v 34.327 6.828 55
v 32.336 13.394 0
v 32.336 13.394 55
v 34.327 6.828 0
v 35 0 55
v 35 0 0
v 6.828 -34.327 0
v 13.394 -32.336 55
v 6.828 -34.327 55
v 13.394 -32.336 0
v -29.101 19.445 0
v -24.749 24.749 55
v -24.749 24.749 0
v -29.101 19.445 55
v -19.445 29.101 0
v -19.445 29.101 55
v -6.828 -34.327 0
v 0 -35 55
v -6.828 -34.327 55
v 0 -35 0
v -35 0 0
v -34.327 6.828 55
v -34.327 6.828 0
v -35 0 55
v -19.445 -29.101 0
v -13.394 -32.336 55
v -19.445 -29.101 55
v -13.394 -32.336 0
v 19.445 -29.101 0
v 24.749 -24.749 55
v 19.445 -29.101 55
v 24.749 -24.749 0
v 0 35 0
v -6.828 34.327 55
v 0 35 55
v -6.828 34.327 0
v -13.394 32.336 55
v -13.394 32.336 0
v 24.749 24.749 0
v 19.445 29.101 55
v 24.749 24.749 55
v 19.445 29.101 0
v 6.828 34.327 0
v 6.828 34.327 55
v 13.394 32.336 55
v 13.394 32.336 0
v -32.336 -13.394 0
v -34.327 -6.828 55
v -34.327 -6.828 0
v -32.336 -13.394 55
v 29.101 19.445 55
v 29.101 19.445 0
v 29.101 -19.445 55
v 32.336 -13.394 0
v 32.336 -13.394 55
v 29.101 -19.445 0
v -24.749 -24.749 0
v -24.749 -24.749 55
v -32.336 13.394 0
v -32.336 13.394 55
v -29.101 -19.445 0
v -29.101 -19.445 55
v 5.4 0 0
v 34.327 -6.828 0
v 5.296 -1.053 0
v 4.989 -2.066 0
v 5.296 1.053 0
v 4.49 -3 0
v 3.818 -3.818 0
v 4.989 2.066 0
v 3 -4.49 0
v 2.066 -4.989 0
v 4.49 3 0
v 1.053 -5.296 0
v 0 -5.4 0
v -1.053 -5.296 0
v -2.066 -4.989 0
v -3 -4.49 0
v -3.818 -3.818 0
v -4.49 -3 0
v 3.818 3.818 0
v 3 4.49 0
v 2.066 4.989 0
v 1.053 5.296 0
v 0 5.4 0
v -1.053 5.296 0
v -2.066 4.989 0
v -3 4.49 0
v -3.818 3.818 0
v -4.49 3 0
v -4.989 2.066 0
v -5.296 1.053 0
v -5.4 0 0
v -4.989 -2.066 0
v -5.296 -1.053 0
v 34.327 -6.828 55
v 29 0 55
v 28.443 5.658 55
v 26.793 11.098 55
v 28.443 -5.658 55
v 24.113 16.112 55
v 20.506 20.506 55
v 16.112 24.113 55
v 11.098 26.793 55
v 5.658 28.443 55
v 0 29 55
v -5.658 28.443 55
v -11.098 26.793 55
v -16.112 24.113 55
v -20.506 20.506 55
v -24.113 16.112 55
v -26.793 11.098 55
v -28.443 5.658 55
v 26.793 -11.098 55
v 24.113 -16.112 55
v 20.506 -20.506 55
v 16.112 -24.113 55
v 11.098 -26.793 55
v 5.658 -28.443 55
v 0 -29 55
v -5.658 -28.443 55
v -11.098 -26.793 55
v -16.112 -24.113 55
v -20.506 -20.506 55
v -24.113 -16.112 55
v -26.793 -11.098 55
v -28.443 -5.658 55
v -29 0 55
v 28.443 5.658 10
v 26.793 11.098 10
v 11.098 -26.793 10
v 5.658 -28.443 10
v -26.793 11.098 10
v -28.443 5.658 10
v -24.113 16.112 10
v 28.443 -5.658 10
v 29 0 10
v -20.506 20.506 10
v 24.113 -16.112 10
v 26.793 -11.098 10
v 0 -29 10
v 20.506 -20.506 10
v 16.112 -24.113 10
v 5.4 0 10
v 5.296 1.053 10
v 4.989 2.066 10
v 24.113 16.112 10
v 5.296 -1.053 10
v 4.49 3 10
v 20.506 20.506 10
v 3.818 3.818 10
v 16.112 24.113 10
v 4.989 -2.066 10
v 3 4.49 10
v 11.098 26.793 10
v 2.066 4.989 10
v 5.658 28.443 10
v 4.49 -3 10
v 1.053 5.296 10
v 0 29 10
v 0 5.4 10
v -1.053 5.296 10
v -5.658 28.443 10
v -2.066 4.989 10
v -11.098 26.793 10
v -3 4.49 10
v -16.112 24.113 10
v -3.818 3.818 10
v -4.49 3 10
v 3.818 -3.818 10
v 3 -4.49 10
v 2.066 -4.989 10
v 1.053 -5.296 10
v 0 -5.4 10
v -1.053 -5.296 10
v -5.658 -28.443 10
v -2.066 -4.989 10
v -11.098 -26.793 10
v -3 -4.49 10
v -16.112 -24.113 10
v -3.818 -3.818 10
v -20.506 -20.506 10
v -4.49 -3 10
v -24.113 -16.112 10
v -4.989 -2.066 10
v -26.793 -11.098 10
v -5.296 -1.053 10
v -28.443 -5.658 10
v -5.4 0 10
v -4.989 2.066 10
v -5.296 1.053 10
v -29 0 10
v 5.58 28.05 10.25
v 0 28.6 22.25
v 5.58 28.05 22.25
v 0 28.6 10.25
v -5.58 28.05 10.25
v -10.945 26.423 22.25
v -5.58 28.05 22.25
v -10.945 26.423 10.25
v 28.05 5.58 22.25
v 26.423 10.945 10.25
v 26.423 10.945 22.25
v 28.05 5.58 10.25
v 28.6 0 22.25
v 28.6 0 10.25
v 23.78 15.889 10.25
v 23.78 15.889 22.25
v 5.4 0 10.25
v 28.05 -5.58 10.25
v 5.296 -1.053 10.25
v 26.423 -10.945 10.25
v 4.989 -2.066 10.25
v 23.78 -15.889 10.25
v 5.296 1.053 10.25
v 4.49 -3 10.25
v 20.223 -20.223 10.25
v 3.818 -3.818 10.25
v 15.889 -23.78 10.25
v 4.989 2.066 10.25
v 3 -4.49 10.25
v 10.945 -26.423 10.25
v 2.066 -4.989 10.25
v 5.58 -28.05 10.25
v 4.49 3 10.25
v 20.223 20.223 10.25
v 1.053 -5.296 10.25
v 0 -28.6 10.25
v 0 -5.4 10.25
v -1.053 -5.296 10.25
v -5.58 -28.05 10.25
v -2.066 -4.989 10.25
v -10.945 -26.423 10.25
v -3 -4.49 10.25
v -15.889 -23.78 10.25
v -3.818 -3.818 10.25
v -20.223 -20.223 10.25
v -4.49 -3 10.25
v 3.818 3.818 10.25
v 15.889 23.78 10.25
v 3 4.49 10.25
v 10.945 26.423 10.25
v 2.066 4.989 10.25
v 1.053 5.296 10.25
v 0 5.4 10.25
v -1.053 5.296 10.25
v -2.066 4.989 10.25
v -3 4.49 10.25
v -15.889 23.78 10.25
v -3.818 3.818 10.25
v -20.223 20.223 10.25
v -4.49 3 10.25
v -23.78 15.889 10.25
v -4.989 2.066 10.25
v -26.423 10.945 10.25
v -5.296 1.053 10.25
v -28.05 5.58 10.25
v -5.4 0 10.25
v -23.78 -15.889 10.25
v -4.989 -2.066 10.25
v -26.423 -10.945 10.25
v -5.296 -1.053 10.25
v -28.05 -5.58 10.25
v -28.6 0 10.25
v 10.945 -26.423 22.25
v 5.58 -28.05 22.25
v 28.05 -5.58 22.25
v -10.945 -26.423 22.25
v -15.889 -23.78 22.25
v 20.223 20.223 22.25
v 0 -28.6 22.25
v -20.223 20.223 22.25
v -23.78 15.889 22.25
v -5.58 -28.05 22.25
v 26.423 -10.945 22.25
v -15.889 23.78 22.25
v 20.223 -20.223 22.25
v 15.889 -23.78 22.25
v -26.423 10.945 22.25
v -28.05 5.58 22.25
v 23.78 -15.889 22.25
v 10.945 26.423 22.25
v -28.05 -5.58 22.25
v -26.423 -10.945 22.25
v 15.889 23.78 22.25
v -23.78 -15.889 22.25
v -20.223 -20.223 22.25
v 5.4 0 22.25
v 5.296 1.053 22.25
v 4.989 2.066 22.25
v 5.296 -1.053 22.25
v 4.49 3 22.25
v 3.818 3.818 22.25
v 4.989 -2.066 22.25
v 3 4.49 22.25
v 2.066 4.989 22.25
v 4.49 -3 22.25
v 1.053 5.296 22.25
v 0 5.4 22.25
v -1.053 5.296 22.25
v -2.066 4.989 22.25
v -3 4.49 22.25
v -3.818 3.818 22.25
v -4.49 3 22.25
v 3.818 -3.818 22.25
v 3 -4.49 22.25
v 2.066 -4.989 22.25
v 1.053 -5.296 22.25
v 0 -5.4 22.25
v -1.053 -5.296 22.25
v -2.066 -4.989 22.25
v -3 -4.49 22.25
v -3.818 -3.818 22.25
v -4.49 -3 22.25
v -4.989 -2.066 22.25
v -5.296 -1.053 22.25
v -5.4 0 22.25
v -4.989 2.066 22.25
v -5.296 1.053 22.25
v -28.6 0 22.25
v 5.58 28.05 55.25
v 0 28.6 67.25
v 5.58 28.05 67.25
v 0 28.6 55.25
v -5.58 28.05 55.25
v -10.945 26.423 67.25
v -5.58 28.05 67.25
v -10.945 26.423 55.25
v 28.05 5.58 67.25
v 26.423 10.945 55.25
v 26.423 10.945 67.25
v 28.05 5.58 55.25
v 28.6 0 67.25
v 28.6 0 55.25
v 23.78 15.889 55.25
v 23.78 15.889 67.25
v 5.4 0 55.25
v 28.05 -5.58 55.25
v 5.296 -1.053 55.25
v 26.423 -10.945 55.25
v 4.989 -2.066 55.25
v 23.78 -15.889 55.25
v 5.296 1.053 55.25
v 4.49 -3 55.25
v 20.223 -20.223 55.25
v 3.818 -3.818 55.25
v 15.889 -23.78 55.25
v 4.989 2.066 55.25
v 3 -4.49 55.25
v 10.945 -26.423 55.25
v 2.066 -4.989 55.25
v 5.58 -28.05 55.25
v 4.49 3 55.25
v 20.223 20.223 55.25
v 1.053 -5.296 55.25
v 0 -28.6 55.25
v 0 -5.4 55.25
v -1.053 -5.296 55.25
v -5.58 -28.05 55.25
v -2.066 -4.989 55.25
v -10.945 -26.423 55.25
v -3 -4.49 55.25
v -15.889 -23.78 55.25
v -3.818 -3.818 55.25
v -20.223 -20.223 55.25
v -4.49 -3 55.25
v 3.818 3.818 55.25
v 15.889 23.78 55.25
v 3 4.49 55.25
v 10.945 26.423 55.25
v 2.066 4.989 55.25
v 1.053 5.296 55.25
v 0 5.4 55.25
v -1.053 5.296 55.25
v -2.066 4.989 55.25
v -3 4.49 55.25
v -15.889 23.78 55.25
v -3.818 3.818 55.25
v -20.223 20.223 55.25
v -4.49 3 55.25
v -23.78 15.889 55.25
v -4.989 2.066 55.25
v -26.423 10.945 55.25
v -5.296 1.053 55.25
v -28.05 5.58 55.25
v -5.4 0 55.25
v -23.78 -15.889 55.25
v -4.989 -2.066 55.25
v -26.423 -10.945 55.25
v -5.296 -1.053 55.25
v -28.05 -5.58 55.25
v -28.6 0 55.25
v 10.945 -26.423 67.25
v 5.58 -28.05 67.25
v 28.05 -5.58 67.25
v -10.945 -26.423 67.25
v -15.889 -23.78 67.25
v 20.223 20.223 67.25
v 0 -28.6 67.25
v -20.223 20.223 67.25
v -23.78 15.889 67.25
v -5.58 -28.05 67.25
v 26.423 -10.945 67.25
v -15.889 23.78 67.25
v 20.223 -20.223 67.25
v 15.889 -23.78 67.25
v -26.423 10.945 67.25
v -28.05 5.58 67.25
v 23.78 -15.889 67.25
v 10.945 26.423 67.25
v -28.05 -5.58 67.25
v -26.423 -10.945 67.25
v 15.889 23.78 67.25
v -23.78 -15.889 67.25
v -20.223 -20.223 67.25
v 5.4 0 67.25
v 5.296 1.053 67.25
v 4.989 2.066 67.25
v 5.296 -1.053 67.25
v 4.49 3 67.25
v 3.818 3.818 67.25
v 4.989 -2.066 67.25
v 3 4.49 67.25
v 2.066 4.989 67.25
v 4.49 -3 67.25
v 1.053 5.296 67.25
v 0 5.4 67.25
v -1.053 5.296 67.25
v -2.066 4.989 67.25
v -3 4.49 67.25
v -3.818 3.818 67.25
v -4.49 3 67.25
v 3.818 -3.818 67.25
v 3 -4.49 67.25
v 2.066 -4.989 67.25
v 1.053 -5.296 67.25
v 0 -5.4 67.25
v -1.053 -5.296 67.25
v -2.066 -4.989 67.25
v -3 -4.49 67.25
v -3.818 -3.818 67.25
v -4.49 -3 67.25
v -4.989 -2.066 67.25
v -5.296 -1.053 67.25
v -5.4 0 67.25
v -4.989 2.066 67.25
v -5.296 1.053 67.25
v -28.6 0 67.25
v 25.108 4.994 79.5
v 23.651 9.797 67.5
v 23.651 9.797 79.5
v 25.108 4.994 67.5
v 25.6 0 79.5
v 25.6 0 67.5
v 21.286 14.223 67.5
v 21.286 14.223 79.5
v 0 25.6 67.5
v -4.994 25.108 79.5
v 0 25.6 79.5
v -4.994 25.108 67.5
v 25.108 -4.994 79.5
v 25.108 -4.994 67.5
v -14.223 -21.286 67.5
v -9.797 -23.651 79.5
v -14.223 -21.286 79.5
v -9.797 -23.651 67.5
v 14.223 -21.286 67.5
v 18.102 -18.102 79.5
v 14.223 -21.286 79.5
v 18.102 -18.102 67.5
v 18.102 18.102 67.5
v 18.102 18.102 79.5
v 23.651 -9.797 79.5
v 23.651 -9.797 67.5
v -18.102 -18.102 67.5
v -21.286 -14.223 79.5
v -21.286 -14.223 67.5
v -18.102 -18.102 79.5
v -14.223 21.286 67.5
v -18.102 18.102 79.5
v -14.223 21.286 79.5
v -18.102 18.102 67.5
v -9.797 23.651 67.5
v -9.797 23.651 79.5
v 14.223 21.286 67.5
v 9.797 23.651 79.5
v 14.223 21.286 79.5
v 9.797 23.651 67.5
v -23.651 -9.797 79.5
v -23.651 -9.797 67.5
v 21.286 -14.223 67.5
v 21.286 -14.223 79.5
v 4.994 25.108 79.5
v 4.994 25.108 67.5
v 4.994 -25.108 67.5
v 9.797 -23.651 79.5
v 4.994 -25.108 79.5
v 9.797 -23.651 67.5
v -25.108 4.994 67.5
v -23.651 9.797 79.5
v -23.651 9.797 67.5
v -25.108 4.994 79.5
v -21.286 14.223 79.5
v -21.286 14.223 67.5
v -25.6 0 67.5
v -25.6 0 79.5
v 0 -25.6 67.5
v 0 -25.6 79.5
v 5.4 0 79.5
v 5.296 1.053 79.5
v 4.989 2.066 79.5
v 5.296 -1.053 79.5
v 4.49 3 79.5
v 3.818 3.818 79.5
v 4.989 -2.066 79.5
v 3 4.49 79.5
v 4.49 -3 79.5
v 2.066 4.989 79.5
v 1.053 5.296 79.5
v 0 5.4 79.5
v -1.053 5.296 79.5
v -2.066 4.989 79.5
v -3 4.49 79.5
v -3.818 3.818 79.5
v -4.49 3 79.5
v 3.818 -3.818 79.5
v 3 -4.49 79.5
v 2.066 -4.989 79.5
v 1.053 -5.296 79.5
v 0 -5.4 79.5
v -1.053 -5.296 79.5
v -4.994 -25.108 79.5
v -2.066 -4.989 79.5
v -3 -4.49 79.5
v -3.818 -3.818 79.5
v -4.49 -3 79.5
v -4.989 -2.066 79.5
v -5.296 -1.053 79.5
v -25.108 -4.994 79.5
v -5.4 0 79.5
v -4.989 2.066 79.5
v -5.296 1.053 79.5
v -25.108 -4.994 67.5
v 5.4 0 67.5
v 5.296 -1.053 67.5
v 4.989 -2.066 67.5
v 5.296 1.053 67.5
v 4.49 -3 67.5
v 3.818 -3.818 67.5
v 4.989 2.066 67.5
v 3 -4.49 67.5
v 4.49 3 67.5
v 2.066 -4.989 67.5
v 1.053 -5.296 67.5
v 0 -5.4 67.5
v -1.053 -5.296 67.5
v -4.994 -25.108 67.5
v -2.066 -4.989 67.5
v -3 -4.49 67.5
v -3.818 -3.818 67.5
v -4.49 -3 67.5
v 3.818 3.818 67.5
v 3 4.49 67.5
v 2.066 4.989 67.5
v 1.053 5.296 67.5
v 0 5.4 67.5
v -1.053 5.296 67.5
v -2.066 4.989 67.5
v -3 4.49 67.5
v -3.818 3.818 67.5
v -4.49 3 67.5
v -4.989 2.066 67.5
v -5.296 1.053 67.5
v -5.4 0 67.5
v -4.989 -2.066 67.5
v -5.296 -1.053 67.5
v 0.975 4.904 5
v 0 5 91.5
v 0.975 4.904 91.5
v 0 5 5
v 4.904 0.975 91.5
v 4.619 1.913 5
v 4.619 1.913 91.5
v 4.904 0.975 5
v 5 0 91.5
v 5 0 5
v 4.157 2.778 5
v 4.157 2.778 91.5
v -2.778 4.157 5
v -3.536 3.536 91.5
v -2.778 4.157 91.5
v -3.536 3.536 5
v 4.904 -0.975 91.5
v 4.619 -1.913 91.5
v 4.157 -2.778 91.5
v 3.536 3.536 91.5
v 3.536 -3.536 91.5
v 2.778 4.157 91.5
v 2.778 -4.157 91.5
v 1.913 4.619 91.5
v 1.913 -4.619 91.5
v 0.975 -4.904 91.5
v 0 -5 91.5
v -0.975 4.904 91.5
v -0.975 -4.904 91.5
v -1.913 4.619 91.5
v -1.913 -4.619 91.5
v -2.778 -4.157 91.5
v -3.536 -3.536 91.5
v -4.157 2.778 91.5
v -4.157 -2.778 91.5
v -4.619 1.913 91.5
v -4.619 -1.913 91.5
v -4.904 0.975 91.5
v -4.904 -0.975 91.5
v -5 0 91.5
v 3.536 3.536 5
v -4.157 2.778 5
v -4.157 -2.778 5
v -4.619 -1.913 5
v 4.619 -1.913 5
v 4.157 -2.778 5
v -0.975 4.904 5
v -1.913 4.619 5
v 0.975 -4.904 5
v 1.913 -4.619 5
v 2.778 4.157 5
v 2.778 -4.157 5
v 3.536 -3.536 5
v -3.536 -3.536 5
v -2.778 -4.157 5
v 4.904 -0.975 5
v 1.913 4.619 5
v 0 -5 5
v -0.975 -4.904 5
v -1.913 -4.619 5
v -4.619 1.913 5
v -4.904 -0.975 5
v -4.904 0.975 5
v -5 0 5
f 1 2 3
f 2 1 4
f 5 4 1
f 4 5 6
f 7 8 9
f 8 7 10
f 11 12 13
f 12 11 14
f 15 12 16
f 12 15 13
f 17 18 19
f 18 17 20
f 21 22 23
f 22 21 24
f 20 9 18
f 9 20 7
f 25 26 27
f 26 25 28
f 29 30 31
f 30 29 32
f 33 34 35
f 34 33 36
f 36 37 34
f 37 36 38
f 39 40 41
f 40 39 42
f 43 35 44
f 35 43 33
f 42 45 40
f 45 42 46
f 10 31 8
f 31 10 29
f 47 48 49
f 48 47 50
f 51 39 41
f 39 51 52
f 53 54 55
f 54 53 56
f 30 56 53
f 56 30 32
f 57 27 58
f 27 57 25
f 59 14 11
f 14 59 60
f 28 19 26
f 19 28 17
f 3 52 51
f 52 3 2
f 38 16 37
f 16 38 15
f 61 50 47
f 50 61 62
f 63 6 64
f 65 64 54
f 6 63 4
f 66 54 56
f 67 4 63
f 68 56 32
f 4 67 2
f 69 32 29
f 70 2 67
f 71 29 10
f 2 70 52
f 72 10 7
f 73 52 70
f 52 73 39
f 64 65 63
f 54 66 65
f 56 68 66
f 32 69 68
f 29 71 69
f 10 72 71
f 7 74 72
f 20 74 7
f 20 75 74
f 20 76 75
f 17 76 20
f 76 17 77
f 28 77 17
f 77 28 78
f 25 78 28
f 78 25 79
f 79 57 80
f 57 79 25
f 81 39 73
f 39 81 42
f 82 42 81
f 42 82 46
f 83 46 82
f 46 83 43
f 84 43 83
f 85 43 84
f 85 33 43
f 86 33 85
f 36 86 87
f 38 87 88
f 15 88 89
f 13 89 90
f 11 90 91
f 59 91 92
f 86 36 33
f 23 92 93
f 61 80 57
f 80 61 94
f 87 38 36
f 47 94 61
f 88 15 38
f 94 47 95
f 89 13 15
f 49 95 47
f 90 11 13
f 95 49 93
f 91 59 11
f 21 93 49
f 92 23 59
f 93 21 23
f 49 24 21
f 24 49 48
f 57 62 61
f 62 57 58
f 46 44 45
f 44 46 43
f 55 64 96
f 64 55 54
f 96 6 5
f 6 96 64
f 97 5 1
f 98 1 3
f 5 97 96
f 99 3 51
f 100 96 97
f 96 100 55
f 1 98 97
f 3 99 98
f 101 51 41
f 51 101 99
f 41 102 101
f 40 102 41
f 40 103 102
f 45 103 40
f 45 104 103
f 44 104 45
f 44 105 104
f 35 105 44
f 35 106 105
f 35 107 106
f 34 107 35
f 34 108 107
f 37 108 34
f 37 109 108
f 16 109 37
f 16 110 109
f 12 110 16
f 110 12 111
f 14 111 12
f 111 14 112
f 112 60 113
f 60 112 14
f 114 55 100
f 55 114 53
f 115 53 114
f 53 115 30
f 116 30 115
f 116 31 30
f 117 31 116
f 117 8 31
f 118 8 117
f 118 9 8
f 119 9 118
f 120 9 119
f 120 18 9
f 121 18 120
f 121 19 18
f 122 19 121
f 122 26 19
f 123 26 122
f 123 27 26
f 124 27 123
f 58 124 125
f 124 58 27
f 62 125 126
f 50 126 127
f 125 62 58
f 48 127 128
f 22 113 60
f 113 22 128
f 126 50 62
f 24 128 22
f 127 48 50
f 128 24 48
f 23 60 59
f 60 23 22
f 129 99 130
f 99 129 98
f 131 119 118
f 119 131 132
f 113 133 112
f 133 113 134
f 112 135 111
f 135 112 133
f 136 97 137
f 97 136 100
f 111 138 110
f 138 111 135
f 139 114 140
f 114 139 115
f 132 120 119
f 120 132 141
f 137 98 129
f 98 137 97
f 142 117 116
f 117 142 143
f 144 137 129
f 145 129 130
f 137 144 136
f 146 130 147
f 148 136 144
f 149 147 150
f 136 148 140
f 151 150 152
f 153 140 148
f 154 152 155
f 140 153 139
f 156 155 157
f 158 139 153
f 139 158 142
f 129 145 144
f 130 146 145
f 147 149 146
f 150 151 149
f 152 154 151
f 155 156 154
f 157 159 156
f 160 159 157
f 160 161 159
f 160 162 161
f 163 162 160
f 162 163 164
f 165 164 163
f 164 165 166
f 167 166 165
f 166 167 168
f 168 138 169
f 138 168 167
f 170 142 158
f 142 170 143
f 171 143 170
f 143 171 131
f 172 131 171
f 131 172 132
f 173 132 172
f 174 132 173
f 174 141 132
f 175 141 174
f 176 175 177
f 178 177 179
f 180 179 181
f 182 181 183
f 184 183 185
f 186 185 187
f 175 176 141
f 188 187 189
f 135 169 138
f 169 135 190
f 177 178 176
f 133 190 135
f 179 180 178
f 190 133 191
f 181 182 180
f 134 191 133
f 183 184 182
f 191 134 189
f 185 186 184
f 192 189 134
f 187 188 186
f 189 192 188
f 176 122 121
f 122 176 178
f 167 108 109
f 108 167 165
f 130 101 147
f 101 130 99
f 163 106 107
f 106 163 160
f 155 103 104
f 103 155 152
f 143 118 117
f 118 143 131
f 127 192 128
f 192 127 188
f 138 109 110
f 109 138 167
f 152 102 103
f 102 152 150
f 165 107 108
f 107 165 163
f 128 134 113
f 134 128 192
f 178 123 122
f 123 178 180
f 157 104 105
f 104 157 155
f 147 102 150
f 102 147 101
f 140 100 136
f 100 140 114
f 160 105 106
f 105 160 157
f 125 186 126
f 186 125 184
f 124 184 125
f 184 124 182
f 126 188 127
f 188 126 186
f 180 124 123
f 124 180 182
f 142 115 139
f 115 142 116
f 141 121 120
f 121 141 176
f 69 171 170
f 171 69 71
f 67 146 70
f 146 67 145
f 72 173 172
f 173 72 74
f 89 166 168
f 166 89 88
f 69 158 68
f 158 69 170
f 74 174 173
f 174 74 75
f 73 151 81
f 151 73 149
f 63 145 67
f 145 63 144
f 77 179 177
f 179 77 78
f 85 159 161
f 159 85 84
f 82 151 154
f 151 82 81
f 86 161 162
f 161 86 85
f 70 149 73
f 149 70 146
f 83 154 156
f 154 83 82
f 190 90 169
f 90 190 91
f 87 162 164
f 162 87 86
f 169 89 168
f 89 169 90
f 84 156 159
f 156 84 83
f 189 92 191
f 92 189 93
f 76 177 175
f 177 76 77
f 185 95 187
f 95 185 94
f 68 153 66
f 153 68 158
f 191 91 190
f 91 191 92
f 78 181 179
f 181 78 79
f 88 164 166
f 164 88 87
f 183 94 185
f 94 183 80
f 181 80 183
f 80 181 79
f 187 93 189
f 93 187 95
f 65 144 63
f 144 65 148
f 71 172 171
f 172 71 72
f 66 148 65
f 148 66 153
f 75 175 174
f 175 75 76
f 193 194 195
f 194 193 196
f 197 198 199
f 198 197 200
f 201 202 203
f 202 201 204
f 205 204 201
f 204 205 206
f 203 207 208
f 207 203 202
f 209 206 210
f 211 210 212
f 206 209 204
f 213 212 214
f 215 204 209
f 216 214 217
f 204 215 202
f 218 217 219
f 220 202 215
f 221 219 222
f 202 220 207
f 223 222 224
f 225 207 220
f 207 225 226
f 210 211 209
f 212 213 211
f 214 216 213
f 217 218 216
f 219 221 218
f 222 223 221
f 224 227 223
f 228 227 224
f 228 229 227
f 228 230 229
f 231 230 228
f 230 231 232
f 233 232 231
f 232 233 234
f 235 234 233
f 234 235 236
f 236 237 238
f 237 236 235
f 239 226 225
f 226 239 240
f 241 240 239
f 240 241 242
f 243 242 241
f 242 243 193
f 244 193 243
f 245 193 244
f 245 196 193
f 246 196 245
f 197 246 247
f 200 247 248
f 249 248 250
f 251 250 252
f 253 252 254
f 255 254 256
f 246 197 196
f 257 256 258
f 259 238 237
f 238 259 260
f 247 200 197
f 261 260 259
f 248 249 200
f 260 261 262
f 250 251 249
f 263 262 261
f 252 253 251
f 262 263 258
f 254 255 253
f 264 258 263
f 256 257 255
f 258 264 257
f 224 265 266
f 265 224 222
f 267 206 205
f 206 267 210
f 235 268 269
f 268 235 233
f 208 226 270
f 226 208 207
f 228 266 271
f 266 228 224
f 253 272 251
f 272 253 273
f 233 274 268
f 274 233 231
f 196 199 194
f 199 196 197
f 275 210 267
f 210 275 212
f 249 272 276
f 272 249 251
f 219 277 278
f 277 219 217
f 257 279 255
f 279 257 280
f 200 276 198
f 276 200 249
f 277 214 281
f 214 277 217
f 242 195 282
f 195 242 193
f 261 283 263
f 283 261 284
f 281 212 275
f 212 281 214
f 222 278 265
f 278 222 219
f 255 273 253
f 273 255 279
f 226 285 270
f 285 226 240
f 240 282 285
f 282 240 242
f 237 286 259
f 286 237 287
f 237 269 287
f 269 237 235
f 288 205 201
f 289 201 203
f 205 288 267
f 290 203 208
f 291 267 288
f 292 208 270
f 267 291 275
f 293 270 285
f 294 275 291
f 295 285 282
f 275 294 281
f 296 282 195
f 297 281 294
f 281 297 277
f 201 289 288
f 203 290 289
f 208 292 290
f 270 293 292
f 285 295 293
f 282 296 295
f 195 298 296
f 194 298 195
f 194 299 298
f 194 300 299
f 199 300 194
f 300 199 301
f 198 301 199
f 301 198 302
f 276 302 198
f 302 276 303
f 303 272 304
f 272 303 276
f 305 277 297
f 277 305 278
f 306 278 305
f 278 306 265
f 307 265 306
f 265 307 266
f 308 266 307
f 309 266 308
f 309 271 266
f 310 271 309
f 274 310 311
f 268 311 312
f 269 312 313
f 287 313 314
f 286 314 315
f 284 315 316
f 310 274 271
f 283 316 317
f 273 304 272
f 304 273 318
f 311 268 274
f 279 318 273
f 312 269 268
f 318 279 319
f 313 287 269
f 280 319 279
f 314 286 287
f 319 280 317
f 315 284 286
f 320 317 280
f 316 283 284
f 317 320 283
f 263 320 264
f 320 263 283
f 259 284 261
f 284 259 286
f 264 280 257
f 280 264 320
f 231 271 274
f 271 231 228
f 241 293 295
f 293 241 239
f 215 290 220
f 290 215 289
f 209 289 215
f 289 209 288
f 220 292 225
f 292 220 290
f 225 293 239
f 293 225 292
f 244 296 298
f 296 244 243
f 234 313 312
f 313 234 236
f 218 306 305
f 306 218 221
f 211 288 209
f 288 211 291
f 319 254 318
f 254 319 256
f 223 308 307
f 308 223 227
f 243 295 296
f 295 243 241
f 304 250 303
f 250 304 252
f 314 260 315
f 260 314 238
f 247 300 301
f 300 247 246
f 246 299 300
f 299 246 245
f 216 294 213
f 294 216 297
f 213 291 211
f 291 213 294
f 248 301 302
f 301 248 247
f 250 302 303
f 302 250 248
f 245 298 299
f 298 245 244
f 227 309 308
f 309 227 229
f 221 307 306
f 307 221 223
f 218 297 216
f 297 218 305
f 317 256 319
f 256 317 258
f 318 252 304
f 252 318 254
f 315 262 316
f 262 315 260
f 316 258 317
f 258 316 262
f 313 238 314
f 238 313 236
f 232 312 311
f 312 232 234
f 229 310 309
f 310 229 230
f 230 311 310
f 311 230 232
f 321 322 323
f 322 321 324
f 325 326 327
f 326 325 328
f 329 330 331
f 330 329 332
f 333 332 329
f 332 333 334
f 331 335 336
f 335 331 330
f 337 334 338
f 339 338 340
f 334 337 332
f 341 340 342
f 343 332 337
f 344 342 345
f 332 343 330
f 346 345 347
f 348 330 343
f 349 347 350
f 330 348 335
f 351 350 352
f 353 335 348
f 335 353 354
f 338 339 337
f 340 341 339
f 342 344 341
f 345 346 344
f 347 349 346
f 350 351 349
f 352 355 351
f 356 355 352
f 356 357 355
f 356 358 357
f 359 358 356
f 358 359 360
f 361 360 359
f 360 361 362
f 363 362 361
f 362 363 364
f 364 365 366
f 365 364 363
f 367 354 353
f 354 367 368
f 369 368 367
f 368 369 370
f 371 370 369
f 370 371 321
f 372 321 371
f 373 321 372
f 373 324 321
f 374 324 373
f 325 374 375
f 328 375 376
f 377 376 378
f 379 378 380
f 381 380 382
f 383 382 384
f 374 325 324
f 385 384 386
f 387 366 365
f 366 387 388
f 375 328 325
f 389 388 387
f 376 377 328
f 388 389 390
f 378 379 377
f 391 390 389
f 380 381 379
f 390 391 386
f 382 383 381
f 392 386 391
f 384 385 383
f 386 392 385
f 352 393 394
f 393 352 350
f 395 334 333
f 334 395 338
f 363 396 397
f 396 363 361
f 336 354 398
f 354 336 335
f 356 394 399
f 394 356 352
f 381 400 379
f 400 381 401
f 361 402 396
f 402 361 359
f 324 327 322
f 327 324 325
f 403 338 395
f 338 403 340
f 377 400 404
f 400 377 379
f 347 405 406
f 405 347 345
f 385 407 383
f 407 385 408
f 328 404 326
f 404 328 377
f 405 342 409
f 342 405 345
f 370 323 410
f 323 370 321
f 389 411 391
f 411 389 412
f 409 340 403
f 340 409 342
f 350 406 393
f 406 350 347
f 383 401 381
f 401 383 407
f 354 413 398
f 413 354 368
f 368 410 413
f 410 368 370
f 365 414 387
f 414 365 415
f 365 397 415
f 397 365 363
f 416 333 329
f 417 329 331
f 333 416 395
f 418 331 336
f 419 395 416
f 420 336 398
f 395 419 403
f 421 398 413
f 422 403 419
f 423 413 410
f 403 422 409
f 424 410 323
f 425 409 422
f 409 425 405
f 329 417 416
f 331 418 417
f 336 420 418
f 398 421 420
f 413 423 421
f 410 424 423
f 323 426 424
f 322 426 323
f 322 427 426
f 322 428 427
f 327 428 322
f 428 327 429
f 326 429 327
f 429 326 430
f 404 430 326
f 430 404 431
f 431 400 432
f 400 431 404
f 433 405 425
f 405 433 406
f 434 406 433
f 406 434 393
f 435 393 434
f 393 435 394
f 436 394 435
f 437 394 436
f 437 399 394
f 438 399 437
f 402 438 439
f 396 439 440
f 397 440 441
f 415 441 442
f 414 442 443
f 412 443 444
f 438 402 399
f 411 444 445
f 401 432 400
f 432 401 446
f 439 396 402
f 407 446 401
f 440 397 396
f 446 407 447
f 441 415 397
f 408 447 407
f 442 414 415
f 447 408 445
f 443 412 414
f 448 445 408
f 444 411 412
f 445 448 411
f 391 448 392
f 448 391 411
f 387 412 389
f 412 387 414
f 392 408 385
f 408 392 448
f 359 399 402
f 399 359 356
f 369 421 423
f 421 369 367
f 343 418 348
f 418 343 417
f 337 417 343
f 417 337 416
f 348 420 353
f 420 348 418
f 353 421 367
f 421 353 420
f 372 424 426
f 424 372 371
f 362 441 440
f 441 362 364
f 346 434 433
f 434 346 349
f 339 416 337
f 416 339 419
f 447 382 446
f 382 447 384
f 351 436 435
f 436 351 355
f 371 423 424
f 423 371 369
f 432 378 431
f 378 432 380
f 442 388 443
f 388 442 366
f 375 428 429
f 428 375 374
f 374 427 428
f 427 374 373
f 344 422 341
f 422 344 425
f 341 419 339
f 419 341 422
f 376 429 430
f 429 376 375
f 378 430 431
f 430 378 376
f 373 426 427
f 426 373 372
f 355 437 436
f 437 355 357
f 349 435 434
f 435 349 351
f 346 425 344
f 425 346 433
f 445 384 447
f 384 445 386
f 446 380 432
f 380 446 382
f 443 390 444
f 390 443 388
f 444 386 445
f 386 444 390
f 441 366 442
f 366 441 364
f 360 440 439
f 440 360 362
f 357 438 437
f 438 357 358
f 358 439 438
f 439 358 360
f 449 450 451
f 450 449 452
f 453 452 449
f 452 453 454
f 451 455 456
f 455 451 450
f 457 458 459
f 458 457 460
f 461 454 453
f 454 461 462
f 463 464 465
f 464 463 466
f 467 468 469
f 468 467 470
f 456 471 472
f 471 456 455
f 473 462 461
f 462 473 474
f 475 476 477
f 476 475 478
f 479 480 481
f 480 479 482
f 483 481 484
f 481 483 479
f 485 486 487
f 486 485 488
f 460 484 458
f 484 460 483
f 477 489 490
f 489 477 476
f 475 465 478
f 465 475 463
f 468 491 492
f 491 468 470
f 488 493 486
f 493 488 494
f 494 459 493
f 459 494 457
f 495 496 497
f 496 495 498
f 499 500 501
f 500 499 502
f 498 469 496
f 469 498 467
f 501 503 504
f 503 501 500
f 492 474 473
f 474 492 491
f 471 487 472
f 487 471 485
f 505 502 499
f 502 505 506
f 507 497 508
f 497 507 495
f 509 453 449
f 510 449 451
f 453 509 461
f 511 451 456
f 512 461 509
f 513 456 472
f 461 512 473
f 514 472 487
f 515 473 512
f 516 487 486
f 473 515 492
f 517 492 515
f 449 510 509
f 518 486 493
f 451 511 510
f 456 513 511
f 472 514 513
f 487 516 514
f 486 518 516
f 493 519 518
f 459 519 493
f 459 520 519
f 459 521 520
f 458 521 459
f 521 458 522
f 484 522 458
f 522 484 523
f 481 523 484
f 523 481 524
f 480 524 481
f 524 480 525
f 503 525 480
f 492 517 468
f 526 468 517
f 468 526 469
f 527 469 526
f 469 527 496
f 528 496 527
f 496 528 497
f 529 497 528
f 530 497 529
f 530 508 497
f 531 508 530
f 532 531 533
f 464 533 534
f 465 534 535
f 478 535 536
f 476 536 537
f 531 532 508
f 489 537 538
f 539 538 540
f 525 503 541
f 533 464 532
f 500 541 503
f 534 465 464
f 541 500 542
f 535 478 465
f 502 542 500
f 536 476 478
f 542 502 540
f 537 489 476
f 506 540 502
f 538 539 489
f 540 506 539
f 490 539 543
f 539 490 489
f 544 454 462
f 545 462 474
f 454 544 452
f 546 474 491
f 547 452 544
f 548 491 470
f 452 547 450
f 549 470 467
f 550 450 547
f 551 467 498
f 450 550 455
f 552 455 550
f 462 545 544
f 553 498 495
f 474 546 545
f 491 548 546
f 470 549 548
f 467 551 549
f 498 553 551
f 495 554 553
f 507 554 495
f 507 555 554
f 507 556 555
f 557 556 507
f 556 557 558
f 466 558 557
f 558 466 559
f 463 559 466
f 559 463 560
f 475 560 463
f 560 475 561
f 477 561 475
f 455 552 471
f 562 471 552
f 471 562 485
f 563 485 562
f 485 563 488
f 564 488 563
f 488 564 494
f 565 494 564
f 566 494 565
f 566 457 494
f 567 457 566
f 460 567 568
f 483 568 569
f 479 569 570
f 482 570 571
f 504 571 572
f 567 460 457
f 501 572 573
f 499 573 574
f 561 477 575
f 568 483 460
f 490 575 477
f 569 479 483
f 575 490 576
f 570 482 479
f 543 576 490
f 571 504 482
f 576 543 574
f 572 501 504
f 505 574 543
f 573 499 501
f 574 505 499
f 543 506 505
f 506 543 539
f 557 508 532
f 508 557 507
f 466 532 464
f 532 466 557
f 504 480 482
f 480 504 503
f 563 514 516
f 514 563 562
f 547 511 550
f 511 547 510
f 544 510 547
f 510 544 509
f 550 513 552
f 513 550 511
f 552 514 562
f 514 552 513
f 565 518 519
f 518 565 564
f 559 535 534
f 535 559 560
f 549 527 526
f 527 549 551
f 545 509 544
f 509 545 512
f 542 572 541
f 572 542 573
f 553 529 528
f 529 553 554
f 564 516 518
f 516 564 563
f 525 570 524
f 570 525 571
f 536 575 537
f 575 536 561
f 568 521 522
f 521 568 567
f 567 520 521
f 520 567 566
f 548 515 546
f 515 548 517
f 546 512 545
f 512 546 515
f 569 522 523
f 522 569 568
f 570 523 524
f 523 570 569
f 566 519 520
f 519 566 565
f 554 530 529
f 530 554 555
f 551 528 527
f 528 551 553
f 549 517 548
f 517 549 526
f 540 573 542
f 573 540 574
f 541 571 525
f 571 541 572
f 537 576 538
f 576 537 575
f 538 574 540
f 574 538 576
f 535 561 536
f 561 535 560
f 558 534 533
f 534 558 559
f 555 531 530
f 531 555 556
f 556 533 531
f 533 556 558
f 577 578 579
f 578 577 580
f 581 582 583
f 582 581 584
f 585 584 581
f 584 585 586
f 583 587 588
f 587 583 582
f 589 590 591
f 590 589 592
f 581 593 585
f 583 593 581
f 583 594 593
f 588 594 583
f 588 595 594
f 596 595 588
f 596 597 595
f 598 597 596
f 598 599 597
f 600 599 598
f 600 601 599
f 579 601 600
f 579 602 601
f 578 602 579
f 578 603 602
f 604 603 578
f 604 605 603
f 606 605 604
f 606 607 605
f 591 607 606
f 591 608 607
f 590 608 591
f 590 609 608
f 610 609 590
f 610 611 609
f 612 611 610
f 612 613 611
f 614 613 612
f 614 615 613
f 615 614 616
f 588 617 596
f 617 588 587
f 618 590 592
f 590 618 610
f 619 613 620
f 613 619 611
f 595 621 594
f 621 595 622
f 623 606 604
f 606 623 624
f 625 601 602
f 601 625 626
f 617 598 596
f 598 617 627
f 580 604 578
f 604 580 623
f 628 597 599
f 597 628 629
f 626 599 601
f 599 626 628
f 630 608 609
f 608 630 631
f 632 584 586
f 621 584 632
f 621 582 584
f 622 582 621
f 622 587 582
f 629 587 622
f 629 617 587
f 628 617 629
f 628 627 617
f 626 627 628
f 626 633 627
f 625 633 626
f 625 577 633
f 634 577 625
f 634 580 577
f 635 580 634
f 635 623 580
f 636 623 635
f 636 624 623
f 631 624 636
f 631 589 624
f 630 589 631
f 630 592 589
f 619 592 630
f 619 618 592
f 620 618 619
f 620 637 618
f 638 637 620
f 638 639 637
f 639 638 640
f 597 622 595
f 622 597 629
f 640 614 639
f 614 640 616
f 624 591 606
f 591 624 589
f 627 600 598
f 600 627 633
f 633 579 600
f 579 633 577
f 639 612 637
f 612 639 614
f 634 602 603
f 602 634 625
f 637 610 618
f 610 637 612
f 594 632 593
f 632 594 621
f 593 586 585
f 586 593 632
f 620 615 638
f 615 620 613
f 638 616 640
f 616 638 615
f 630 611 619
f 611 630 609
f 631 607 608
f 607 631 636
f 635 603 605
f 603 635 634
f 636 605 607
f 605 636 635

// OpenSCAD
$fn = 32;

// ------------------------------------------------------------------------
// Bearing housing: housing d70, two bearings and a shaft
// Every part is its own module, assembly() places them once.
// ------------------------------------------------------------------------

// --- part 1 ---
module housing() {
  difference() {
    cylinder(h = 55, d = 70);
    translate([0, 0, 10]) cylinder(h = 46, d = 58);
    translate([0, 0, -1]) cylinder(h = 12, d = 10.8);
  }
}

// --- part 2 ---
module bearing_lower() {
  difference() {
      translate([0, 0, 0]) cylinder(h = 12, d = 57.2);
      translate([0, 0, -1]) cylinder(h = 14, d = 10.8);
    }
}

// --- part 3 ---
module bearing_upper() {
  difference() {
      translate([0, 0, 0]) cylinder(h = 12, d = 57.2);
      translate([0, 0, -1]) cylinder(h = 14, d = 10.8);
    }
}

// --- part 4 ---
module spacer() {
  difference() {
      translate([0, 0, 0]) cylinder(h = 12, d = 51.2);
      translate([0, 0, -1]) cylinder(h = 14, d = 10.8);
    }
}

// --- part 5 ---
module shaft() {
  translate([0, 0, -43.25]) cylinder(h = 86.5, d = 10);
}

// --- assembly ---
module assembly() {
  translate([0, 0, 0]) rotate([0, 0, 0]) housing();
  translate([0, 0, 10.25]) rotate([0, 0, 0]) bearing_lower();
  translate([0, 0, 55.25]) rotate([0, 0, 0]) bearing_upper();
  translate([0, 0, 67.5]) rotate([0, 0, 0]) spacer();
  translate([0, 0, 48.25]) rotate([0, 0, 0]) shaft();
}

assembly();
